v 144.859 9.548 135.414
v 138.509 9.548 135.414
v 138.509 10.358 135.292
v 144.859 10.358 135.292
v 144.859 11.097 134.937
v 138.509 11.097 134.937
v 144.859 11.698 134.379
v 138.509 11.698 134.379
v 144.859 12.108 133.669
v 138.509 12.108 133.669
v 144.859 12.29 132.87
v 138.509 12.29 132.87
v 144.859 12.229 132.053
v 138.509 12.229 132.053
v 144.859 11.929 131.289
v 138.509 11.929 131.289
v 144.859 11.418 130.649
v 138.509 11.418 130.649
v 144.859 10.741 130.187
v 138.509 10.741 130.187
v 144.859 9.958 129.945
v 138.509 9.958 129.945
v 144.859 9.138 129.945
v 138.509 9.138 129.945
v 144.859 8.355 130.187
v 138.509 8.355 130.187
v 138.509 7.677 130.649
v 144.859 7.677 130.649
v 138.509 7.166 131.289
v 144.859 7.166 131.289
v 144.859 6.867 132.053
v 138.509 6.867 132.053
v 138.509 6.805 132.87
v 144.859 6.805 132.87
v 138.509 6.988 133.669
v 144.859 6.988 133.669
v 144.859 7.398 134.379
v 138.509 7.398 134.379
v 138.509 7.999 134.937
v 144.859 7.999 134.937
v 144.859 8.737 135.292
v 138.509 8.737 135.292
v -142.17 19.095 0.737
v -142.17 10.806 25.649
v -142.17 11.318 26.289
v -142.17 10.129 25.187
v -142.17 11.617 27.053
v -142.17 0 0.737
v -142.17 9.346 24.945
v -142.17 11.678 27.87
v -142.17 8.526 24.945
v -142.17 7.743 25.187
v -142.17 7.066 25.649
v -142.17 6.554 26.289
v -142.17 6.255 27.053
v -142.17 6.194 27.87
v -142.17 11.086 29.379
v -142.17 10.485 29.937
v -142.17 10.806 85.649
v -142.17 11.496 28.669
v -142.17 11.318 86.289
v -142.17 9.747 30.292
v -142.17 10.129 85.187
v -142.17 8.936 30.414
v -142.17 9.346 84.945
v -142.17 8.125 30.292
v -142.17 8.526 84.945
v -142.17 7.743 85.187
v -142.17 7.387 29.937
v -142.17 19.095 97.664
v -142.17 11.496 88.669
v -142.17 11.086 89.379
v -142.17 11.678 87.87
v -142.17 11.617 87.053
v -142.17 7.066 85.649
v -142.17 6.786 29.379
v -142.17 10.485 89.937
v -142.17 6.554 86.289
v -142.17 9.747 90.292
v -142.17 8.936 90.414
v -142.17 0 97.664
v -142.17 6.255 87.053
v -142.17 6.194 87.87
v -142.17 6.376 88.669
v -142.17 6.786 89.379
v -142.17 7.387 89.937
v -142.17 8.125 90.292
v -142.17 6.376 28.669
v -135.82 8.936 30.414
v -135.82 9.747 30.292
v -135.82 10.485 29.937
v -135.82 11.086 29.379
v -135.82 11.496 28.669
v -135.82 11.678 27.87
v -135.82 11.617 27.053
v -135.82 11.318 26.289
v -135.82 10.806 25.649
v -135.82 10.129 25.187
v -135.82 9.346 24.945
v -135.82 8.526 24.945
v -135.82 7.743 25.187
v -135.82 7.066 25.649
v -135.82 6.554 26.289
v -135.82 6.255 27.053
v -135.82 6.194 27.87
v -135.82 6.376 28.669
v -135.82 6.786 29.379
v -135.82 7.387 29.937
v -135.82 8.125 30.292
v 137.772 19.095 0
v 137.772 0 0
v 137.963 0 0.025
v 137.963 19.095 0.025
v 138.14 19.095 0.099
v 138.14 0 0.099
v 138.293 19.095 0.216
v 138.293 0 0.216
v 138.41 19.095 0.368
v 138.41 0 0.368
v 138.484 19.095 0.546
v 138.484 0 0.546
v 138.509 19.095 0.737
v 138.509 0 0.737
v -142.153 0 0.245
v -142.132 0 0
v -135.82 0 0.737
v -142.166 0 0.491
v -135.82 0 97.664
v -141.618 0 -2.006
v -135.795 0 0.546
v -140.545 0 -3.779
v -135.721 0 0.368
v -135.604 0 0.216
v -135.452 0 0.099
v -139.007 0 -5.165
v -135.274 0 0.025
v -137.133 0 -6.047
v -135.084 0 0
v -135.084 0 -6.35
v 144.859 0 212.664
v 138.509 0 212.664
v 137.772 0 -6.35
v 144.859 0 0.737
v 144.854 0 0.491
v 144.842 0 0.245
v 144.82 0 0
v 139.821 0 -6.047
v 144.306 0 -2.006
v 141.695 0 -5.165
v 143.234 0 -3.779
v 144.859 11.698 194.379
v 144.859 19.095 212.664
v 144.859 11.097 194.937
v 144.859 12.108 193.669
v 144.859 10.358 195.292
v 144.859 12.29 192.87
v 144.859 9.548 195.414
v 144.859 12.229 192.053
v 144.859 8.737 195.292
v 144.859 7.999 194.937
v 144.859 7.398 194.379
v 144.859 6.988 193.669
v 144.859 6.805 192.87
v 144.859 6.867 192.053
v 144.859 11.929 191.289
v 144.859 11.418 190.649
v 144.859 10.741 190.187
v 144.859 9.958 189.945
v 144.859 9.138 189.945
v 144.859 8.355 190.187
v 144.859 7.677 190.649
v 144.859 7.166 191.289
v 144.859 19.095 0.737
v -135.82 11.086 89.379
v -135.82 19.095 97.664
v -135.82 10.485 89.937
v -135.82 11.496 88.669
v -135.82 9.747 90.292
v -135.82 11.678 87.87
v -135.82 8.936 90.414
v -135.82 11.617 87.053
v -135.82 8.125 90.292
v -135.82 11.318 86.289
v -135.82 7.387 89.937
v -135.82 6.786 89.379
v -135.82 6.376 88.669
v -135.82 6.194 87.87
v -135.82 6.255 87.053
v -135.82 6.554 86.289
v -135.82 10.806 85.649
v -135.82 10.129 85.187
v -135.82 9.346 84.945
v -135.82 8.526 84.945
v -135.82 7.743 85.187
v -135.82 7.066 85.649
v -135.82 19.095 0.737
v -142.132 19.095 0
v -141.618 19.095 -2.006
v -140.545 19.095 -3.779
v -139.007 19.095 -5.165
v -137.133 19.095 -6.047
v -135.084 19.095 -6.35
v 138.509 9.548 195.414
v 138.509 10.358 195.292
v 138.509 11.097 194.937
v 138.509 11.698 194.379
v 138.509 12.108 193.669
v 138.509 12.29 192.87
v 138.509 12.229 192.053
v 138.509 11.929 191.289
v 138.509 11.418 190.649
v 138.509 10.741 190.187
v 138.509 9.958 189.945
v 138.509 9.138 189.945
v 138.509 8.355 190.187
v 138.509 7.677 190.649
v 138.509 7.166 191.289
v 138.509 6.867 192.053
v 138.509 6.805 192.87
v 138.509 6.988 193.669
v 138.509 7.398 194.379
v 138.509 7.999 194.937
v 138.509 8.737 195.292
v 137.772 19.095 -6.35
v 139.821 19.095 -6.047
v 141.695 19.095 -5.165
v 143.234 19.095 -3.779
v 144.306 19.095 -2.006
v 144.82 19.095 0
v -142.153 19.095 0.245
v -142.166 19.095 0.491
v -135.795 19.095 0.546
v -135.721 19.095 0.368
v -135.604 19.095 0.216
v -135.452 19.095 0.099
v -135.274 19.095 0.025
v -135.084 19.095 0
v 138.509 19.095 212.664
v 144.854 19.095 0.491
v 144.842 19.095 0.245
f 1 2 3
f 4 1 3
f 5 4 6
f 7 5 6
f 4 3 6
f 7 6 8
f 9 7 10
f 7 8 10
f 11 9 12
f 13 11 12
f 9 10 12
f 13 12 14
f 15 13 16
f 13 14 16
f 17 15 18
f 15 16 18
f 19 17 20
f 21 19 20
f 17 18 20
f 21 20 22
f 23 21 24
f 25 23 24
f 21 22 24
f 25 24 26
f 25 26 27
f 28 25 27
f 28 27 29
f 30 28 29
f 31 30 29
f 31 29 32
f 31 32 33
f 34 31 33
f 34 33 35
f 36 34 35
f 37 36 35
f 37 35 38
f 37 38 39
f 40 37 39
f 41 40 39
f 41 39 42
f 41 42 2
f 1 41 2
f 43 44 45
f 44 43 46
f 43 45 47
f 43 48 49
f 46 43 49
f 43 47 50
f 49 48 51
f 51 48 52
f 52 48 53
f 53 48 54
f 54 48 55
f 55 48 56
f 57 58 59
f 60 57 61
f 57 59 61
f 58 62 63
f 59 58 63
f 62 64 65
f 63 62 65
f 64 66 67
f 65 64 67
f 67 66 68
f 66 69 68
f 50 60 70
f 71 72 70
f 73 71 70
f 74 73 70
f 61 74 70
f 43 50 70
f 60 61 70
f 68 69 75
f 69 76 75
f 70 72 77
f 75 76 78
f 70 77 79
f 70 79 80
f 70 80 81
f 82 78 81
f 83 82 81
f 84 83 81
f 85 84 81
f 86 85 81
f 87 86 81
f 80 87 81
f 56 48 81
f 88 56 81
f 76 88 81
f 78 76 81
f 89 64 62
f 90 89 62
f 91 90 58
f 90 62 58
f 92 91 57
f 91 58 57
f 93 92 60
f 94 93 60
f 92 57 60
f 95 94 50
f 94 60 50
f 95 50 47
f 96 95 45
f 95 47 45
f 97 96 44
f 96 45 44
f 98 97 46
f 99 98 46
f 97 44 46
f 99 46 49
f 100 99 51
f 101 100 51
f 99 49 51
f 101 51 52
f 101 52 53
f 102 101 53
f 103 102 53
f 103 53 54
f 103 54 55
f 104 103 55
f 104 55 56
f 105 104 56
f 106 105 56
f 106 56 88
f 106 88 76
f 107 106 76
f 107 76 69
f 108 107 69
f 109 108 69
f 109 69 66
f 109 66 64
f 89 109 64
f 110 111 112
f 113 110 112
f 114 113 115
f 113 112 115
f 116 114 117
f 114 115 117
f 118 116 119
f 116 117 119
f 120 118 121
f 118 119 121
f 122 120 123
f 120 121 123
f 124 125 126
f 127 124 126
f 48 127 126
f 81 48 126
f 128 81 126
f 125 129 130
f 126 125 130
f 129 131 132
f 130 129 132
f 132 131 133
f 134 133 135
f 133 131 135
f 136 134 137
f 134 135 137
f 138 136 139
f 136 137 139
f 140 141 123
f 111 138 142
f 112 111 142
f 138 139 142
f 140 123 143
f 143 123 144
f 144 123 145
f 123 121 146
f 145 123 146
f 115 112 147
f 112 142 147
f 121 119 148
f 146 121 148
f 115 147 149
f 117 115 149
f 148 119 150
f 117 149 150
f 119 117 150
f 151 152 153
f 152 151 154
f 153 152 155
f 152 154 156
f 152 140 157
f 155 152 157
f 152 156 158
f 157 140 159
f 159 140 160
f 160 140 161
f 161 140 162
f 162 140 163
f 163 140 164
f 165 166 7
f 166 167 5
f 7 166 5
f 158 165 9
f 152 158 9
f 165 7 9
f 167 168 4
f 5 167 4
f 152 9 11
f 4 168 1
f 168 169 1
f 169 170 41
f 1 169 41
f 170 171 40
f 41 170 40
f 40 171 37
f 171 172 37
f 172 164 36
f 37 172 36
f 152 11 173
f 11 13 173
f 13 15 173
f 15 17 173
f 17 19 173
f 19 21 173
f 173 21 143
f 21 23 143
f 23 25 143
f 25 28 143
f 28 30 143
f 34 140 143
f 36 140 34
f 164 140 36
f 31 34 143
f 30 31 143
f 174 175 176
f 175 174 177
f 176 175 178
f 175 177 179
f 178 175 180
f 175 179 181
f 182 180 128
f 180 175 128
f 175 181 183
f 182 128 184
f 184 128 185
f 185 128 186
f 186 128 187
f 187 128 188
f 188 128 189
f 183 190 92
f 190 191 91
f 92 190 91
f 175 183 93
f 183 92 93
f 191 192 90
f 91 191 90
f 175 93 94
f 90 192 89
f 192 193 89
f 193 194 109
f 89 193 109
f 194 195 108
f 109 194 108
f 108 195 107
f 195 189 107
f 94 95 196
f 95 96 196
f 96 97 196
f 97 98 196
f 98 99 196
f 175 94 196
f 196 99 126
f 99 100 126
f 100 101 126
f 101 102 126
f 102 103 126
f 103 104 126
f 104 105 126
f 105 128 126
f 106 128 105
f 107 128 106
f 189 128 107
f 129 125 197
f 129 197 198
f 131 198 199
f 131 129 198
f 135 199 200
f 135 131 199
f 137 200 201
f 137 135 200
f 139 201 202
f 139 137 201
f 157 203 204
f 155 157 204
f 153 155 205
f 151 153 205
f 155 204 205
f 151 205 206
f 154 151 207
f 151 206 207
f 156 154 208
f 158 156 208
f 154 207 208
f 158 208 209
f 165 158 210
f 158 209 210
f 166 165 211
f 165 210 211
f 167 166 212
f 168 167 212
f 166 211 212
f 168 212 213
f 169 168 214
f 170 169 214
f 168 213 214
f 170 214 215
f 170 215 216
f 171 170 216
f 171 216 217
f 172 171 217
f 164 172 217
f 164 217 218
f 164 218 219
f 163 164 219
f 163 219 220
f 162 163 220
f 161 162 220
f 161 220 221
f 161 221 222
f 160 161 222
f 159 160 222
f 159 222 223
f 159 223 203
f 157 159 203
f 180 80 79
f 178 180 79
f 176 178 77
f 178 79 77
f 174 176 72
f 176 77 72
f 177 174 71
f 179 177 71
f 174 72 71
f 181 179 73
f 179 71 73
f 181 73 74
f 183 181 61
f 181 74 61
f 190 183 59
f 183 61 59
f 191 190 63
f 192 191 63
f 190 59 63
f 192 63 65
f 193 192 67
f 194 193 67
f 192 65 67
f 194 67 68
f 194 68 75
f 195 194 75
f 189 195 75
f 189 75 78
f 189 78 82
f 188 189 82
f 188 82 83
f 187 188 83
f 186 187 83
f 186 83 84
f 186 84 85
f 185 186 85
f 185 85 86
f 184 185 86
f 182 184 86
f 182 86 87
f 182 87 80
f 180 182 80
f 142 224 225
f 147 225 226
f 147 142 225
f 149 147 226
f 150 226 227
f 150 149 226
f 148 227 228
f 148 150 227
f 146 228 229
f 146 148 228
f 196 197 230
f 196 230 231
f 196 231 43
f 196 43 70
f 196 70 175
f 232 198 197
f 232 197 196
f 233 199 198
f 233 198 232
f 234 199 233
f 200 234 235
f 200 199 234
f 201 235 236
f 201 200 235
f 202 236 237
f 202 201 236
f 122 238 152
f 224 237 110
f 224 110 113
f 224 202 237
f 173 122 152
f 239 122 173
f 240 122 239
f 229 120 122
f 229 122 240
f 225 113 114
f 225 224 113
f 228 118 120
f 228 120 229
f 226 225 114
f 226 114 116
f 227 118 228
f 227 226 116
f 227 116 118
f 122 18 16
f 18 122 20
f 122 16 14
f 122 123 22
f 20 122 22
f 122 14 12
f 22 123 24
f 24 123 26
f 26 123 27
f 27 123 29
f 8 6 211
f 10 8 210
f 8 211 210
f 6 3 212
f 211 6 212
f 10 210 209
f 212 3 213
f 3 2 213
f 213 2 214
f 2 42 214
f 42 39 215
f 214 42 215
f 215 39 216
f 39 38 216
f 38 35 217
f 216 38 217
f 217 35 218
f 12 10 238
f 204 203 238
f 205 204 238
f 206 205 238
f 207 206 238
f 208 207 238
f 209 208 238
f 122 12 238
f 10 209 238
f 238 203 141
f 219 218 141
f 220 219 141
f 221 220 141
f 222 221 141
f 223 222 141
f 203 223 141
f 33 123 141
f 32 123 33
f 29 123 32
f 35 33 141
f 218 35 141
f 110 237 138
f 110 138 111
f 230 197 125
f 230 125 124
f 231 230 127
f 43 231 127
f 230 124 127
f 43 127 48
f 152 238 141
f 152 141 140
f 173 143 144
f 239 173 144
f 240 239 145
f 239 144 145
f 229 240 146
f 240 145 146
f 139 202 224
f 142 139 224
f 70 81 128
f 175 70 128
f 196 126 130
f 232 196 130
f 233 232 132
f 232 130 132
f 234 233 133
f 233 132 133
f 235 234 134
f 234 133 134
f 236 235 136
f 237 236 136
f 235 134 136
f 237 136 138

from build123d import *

# Parameters (mm, degrees)
CROQUIS1_W                       = 594
CROQUIS1_H                       = 19.095477387
BRIDA_BASE1_DEPTH                = 6.35
PLIEGUE_CROQUIZADO1_DEPTH        = 19.095477387
PLIEGUE_CROQUIZADO1_2_DEPTH      = 19.095477387
TALADRO_DE_MARGEN_PARA_M51_D     = 5.5
TALADRO_DE_MARGEN_PARA_M52_D     = 5.5
TALADRO_DE_MARGEN_PARA_M52_DEPTH = 6.35


with BuildPart() as part:
    # Brida base1: sheet metal written as solids
    # Croquis1 → Brida base1 (new body)
    with BuildSketch(Plane.XY):
        with Locations((58.84427983, 9.547738694)):
            Rectangle(CROQUIS1_W, CROQUIS1_H)
    extrude(amount=-BRIDA_BASE1_DEPTH)

    # Pliegue croquizado1: read off the stored shape, not the designer's step
    # Pliegue croquizado1 outline → Pliegue croquizado1 (cut)
    with BuildSketch(Plane(origin=(0, 0, 0), x_dir=(1, 0, 0), z_dir=(0, 1, 0))):
        with BuildLine():
            ThreePointArc((-142.131770672, 0), (-139.826968461, 4.528373368), (-135.083556714, 6.35))
            Line((-135.083556714, 6.35), (-238.15572017, 6.35))
            Line((-238.15572017, 6.35), (-238.15572017, 0))
            Line((-238.15572017, 0), (-142.131770672, 0))
        make_face()
        with BuildLine():
            Line((355.84427983, 6.35), (137.772116374, 6.35))
            ThreePointArc((137.772116374, 6.35), (142.515528121, 4.528373367), (144.820330332, 0))
            Line((144.820330332, 0), (355.84427983, 0))
            Line((355.84427983, 0), (355.84427983, 6.35))
        make_face()
    extrude(amount=PLIEGUE_CROQUIZADO1_DEPTH, mode=Mode.SUBTRACT)

    # Pliegue croquizado1 2 outline → Pliegue croquizado1 2 (add)
    with BuildSketch(Plane(origin=(0, 0, 0), x_dir=(1, 0, 0), z_dir=(0, 1, 0))):
        with BuildLine():
            Line((-135.083556714, 0), (-142.131770672, 0))
            ThreePointArc((-142.131770672, 0), (-142.160553697, -0.367800241), (-142.170156714, -0.7366))
            Line((-142.170156714, -0.7366), (-142.170156714, -97.664436544))
            Line((-142.170156714, -97.664436544), (-135.820156714, -97.664436544))
            Line((-135.820156714, -97.664436544), (-135.820156714, -0.7366))
            ThreePointArc((-135.820156714, -0.7366), (-135.604411569, -0.215745145), (-135.083556714, 0))
        make_face()
        with BuildLine():
            ThreePointArc((144.858716374, -0.7366), (144.849113357, -0.367800241), (144.820330332, 0))
            Line((144.820330332, 0), (137.772116374, 0))
            ThreePointArc((137.772116374, 0), (138.292971229, -0.215745145), (138.508716374, -0.7366))
            Line((138.508716374, -0.7366), (138.508716374, -212.664436544))
            Line((138.508716374, -212.664436544), (144.858716374, -212.664436544))
            Line((144.858716374, -212.664436544), (144.858716374, -0.7366))
        make_face()
    extrude(amount=PLIEGUE_CROQUIZADO1_2_DEPTH)

    # Taladro de margen para M51 (through all)
    with Locations(Plane(origin=(144.858716374, 0, 0), x_dir=(0, 0, -1), z_dir=(1, 0, 0))):
        with Locations((-192.664436544, 9.547738693), (-132.664436544, 9.547738693)):
            Hole(TALADRO_DE_MARGEN_PARA_M51_D / 2)

    # Taladro de margen para M52
    with Locations(Plane(origin=(-135.820156714, 0, 0), x_dir=(0, 0, -1), z_dir=(1, 0, 0))):
        with Locations((-87.664436544, 8.935987286), (-27.664436544, 8.935987286)):
            Hole(TALADRO_DE_MARGEN_PARA_M52_D / 2, depth=TALADRO_DE_MARGEN_PARA_M52_DEPTH)


solid = part.part
